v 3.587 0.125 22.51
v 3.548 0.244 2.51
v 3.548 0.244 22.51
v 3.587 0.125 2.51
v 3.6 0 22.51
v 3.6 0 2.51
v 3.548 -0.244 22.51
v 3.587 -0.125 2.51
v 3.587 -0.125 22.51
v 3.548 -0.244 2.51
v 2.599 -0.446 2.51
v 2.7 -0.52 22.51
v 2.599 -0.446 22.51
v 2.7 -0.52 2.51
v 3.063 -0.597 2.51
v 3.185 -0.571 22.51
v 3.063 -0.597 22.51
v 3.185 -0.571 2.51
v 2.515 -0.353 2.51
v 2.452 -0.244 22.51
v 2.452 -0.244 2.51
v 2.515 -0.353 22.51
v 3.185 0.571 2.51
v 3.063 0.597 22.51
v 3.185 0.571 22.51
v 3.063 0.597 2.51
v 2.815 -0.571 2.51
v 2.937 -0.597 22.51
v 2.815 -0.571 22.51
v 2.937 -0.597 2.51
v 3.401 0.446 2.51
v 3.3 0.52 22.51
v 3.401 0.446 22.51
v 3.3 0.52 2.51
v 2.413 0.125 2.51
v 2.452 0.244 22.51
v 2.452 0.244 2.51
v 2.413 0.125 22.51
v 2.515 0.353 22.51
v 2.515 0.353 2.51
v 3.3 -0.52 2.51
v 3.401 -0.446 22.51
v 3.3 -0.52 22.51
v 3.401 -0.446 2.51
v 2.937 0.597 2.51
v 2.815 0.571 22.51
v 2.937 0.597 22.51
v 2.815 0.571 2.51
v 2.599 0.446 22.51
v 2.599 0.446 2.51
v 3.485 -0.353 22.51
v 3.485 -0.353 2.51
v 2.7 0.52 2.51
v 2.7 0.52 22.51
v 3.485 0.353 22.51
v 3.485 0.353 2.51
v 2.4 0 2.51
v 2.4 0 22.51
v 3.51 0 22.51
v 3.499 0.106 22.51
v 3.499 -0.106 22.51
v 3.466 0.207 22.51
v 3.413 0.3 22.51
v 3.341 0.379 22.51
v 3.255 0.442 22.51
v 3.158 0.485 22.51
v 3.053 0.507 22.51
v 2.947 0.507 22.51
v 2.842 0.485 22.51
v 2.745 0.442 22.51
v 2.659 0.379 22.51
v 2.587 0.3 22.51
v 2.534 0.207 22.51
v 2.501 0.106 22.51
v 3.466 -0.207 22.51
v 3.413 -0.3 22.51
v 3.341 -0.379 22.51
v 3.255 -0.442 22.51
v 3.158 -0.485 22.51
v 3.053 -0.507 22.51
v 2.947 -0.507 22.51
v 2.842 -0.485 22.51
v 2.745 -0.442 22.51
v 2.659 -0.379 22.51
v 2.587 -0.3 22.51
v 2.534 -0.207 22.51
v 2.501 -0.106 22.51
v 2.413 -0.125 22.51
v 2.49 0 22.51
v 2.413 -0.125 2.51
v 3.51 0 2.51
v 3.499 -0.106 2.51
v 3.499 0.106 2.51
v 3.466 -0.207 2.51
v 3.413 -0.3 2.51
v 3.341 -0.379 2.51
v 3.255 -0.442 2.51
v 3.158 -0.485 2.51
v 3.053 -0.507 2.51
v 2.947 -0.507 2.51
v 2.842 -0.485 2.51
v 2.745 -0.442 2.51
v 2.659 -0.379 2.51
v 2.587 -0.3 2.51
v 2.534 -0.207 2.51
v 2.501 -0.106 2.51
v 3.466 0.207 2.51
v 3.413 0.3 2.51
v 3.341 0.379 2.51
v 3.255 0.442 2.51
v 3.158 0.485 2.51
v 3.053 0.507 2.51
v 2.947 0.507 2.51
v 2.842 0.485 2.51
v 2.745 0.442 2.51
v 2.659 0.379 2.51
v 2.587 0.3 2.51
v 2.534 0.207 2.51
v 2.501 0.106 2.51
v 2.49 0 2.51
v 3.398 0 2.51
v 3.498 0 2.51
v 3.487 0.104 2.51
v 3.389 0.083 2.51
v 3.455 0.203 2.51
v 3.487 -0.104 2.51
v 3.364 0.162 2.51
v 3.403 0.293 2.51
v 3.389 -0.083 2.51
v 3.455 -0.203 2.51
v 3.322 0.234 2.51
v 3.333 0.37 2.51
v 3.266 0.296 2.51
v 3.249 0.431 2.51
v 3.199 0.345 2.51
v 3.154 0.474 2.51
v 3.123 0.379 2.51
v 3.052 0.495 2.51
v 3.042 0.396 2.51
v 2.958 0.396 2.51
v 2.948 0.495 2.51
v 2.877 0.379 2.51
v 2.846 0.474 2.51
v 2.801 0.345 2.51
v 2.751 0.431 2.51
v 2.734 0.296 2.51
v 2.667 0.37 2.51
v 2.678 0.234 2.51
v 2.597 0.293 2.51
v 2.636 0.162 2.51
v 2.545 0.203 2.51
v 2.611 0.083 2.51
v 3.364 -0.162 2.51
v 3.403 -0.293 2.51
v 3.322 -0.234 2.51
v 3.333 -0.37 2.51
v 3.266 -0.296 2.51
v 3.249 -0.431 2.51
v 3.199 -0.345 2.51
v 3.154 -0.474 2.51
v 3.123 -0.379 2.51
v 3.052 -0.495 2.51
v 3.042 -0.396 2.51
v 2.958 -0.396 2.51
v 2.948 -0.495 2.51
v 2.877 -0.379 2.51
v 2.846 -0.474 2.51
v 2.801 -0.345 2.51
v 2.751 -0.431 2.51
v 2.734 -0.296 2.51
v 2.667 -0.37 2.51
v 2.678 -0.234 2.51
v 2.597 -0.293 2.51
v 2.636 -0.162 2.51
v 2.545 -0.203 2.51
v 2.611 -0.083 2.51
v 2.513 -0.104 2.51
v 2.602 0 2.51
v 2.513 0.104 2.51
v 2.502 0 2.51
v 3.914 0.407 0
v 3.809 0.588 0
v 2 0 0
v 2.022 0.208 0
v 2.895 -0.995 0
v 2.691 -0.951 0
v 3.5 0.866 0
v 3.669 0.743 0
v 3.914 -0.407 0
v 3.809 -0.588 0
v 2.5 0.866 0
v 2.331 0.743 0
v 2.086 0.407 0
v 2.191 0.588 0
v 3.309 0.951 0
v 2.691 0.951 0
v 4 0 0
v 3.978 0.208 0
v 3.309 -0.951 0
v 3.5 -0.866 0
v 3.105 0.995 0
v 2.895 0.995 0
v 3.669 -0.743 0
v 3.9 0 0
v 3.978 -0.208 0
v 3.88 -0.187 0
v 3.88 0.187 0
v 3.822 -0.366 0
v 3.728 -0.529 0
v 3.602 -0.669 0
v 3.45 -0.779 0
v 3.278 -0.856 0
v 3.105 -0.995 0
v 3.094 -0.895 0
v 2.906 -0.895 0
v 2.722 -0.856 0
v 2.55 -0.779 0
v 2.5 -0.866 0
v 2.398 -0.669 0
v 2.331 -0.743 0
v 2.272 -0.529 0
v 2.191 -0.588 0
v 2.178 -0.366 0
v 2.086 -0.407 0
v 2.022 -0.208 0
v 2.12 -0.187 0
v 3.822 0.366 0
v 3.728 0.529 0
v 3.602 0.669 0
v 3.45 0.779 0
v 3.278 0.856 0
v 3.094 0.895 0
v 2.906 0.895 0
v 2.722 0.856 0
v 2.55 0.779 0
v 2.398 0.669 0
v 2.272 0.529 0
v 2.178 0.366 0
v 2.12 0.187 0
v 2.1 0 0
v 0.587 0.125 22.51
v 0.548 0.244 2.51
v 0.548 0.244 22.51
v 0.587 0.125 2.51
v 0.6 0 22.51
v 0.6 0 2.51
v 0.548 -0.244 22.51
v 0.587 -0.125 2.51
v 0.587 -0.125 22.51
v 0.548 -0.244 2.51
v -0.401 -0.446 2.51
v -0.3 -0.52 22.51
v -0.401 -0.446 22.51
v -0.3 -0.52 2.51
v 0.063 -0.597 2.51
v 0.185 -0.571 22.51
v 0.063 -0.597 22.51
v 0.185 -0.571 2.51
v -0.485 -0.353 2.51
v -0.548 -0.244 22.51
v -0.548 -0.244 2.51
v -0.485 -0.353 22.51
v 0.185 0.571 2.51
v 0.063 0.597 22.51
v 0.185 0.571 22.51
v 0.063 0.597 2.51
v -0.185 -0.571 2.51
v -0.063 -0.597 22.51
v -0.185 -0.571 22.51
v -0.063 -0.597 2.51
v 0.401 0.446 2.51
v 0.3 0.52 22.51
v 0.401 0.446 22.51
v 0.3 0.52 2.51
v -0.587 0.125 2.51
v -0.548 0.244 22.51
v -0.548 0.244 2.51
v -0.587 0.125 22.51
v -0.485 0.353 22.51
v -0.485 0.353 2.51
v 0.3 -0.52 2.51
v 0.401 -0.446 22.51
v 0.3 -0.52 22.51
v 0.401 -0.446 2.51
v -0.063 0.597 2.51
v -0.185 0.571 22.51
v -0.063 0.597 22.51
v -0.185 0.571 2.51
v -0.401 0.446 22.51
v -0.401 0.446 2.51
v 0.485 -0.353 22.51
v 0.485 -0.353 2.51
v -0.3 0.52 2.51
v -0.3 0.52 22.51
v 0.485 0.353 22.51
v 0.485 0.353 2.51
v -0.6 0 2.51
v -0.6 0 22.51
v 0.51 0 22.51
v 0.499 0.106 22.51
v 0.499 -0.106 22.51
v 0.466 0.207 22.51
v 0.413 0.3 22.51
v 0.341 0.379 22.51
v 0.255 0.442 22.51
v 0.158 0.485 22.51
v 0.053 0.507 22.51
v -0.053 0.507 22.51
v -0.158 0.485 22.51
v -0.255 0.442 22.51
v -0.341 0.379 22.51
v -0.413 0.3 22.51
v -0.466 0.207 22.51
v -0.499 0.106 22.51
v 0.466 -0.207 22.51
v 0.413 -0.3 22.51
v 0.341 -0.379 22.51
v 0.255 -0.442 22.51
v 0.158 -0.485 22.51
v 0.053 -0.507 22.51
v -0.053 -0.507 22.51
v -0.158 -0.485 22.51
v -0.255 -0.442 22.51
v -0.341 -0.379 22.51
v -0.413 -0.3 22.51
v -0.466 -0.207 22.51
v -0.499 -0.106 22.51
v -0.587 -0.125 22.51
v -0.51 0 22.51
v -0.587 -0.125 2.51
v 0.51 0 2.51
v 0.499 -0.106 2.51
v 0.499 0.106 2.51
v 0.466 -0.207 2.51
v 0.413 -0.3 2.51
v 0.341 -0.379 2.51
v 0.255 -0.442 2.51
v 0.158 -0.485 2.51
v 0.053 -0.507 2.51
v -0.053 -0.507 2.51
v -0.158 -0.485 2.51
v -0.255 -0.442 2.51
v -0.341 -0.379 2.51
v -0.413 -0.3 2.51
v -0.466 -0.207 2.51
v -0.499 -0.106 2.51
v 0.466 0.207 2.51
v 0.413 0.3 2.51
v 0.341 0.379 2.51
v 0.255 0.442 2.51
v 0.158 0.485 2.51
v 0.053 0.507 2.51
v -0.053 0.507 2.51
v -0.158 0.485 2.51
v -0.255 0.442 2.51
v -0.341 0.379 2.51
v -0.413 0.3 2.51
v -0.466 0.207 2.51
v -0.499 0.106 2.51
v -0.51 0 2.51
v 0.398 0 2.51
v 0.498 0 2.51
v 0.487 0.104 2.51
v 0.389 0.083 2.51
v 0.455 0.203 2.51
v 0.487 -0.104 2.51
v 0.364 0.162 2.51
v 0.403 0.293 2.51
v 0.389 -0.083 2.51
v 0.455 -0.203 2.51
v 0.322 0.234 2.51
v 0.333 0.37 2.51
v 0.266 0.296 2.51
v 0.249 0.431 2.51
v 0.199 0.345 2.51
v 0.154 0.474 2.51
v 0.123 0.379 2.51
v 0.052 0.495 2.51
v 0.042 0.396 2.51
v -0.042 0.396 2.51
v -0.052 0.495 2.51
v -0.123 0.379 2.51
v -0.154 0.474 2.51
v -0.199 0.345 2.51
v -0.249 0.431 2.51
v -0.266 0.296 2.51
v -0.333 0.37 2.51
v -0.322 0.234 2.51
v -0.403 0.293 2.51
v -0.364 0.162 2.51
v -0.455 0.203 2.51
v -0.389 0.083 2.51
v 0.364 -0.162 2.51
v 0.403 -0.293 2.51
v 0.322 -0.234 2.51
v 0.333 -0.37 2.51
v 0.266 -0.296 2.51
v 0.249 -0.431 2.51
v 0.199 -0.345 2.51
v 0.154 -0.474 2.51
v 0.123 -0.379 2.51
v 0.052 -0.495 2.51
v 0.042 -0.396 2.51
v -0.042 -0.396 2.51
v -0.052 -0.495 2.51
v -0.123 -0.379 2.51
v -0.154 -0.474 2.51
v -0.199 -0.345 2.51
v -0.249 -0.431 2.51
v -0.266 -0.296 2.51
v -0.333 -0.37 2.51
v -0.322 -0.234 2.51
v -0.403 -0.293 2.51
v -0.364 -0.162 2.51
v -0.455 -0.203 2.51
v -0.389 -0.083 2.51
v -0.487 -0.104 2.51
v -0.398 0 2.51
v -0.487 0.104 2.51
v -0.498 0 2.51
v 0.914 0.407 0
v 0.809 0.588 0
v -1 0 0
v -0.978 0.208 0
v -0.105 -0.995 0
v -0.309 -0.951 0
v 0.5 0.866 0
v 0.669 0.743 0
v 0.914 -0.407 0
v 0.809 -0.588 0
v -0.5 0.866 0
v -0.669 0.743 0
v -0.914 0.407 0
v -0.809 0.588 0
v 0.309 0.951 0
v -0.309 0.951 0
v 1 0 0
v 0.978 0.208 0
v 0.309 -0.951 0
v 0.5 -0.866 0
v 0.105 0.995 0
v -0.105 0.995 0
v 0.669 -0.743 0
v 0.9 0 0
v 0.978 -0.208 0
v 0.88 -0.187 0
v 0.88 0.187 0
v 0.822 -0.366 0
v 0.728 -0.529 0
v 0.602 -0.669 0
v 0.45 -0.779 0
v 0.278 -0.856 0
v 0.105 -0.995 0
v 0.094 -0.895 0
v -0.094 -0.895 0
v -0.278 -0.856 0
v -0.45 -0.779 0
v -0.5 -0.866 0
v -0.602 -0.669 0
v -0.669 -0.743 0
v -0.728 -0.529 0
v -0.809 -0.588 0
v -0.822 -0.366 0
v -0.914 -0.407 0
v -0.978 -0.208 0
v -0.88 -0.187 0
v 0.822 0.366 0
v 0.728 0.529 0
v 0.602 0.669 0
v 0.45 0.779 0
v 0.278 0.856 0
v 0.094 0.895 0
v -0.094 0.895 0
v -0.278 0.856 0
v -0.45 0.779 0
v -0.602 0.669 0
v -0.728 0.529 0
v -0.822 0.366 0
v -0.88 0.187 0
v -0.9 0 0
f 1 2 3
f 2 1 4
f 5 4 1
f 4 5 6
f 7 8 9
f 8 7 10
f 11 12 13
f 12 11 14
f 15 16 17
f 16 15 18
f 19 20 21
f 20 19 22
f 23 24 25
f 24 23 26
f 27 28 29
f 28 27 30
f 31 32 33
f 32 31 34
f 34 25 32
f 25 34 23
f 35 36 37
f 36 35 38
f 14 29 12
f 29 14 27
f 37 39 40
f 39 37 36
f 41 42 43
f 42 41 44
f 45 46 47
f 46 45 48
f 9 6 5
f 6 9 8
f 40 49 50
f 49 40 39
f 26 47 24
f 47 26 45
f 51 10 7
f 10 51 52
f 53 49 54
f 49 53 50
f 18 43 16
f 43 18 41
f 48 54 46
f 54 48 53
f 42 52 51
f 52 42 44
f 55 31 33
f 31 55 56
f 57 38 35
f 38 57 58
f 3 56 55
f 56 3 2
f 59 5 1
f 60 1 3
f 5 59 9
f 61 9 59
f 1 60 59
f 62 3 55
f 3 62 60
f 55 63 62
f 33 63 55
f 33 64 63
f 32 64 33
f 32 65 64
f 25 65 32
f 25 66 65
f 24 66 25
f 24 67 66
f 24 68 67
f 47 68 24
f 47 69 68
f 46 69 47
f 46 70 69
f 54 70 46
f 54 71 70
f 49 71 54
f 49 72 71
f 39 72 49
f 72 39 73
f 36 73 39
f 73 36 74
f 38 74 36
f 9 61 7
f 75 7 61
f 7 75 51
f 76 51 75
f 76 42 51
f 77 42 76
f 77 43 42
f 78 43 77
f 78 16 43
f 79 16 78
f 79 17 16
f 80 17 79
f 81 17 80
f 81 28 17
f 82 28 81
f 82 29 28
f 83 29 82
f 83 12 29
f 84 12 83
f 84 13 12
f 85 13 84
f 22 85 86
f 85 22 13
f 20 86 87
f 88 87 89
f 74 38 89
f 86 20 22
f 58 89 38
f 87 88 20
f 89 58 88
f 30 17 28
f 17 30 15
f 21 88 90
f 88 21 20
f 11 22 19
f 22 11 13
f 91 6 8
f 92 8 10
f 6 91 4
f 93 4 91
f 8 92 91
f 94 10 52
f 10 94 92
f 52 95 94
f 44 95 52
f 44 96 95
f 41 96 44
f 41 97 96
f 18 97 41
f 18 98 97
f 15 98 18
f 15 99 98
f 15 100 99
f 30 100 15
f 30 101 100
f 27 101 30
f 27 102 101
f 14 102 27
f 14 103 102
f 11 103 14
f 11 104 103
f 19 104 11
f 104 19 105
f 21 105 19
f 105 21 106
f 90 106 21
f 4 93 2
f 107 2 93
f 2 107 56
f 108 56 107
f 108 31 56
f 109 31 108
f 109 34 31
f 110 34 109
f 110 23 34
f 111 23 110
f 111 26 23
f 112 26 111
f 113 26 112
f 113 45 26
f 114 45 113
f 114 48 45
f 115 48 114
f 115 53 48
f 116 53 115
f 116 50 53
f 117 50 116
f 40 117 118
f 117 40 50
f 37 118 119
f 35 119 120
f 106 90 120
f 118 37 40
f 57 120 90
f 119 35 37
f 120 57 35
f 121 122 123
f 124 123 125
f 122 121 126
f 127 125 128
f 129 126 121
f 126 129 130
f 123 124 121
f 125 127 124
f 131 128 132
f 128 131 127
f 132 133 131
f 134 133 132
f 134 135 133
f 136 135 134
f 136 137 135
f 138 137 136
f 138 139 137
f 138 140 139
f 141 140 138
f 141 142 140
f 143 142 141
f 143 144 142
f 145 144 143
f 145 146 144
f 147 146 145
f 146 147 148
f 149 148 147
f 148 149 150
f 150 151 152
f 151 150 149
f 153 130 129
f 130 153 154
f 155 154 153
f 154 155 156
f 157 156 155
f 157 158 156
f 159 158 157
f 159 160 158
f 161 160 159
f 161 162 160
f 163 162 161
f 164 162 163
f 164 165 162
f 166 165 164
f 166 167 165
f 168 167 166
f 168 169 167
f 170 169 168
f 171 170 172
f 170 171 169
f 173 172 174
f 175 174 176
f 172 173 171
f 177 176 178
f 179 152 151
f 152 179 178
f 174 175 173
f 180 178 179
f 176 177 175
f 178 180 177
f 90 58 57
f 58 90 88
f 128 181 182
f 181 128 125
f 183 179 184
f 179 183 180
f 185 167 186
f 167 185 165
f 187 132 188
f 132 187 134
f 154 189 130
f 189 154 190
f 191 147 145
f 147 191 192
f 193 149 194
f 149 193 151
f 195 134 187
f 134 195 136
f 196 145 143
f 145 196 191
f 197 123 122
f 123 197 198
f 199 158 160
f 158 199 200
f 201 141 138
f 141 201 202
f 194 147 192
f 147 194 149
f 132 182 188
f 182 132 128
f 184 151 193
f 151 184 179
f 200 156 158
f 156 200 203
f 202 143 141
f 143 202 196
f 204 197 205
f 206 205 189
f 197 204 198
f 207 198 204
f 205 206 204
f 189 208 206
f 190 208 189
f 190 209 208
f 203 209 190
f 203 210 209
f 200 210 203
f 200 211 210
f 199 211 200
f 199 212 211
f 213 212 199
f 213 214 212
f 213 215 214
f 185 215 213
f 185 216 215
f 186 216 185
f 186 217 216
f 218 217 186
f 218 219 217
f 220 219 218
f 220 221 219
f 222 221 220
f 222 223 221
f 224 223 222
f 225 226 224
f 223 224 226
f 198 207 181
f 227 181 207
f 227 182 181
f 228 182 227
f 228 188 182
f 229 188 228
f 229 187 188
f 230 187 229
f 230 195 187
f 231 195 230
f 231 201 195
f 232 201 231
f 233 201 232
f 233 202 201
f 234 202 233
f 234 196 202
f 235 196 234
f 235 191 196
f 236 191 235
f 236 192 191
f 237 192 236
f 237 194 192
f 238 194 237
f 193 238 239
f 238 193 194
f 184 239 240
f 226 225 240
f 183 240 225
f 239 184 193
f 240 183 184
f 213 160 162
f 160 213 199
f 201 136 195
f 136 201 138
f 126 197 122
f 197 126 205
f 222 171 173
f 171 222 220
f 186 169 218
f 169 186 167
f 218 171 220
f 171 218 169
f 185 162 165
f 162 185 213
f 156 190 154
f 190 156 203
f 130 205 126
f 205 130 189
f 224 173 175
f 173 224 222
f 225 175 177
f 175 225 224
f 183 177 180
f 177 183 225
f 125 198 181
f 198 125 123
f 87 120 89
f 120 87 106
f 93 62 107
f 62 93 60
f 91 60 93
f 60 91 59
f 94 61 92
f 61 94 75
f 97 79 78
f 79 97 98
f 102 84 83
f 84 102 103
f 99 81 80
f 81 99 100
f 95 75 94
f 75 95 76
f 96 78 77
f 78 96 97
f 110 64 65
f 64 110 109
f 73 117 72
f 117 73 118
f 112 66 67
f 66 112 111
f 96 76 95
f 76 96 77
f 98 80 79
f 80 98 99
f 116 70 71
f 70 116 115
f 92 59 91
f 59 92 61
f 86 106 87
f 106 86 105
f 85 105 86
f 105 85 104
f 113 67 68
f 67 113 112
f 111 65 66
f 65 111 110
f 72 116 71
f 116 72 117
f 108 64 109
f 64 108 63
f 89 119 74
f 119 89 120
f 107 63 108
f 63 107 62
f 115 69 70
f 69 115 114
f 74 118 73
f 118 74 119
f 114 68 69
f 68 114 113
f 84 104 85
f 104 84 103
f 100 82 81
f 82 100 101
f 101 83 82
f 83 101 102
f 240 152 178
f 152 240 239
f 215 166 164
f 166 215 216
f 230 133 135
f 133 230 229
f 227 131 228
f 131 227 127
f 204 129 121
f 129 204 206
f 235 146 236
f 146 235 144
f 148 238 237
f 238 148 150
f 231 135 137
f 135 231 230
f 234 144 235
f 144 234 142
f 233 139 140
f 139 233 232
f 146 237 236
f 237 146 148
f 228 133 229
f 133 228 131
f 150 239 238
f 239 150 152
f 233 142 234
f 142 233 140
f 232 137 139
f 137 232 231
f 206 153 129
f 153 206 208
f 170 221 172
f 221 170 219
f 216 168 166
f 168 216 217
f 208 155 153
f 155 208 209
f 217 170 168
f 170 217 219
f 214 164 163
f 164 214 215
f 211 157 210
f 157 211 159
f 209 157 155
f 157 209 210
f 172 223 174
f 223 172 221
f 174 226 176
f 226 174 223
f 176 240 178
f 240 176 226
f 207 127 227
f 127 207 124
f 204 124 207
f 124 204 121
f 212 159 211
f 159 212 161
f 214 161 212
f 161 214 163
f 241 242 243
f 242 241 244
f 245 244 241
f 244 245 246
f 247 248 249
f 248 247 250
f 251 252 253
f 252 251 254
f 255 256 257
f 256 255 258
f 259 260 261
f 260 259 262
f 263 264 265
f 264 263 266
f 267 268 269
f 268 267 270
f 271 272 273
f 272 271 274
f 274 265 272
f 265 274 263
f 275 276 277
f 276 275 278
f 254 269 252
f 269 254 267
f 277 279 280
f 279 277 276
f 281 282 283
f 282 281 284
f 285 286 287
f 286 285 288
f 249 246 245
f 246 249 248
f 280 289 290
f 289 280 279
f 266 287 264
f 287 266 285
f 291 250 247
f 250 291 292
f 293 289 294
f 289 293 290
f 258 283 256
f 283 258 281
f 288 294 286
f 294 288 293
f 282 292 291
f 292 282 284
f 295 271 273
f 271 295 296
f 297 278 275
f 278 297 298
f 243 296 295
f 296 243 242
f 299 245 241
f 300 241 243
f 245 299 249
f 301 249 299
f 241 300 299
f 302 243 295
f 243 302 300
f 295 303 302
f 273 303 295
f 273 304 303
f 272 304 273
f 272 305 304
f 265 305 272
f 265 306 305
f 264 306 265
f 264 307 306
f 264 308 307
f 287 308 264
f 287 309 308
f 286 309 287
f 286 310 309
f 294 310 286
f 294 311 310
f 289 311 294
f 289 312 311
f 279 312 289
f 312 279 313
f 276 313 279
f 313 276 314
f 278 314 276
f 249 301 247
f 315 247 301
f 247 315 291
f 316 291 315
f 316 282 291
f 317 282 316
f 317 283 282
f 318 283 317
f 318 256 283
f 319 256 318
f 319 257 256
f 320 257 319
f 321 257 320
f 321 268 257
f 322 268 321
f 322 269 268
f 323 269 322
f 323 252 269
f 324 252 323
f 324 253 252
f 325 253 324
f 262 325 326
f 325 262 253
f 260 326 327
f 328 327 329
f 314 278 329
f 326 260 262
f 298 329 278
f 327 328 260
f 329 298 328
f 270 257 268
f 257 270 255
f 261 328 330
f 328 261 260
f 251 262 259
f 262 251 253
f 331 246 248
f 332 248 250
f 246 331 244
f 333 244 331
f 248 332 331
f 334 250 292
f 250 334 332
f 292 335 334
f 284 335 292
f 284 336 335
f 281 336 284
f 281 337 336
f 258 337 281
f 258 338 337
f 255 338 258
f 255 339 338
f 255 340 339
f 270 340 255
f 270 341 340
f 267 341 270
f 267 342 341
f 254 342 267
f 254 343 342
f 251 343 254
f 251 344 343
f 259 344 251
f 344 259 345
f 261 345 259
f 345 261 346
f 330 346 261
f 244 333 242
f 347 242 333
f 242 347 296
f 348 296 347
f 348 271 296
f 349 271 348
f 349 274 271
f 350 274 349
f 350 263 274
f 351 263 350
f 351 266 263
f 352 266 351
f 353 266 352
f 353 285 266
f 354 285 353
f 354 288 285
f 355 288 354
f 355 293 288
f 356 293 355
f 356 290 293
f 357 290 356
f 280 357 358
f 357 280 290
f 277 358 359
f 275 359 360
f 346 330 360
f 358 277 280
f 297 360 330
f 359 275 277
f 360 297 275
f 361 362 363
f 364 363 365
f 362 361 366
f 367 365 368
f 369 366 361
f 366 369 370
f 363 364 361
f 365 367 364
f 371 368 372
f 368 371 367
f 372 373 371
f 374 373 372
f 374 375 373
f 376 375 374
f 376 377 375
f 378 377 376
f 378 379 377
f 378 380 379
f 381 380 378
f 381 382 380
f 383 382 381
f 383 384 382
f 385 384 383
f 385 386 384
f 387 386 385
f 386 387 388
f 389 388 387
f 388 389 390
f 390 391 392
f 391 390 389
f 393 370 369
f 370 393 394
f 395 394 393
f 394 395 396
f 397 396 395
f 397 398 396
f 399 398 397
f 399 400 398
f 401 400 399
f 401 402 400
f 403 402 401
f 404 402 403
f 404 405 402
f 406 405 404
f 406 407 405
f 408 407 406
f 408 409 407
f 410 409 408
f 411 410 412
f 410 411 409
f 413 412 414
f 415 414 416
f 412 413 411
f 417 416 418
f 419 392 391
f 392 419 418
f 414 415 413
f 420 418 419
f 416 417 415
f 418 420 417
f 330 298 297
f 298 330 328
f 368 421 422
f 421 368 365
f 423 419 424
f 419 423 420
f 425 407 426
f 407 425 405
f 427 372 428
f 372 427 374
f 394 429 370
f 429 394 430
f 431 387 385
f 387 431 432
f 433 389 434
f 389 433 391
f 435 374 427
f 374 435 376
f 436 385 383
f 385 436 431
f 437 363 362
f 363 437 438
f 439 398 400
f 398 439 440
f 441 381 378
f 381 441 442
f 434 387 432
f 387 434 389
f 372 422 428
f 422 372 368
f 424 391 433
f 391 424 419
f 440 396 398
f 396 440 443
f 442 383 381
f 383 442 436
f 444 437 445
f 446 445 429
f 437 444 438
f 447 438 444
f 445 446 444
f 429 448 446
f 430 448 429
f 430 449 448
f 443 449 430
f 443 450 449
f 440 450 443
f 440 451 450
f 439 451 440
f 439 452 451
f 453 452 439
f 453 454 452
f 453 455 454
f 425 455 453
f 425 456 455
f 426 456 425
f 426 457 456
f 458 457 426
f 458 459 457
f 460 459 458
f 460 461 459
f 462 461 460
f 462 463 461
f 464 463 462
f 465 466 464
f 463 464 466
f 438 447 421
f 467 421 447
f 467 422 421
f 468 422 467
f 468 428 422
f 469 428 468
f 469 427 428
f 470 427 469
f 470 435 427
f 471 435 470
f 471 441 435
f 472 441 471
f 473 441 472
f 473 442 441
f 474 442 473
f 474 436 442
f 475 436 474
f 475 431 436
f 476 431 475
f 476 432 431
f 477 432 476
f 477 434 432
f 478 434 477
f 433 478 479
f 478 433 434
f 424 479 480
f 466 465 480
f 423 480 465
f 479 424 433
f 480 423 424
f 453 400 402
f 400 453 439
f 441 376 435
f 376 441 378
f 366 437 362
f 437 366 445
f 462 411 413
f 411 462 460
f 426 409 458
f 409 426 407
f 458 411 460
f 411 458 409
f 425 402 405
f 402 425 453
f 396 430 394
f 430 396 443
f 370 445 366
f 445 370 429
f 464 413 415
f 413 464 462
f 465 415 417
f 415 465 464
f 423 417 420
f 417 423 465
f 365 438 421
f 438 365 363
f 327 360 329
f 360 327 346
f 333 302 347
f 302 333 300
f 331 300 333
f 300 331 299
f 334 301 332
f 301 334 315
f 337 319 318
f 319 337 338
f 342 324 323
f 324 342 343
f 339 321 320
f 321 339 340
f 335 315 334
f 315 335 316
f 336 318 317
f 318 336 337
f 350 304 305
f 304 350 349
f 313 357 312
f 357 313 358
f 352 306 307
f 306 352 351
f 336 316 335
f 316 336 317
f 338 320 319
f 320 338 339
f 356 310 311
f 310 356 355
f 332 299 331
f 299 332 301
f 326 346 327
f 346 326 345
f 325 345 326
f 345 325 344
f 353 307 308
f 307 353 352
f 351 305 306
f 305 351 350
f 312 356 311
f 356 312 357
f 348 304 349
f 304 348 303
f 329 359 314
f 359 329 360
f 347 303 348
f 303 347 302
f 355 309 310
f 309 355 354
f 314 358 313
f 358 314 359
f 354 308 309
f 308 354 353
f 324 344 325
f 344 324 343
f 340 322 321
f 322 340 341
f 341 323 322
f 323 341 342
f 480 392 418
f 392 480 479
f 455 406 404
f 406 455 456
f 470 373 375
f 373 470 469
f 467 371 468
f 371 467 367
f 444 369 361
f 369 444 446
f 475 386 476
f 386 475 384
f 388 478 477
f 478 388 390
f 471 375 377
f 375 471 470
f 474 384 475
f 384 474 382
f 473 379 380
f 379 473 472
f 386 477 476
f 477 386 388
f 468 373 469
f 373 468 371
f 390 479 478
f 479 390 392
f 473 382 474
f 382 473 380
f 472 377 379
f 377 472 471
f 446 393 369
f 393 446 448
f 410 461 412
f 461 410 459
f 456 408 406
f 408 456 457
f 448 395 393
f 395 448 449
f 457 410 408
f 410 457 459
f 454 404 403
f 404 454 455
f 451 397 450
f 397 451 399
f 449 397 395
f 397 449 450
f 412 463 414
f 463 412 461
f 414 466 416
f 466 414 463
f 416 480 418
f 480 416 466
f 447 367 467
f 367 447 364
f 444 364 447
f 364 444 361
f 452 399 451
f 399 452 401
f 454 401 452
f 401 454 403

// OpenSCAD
// file: forward_landing_gear.scad
use <ship_hull.scad>
module forward_landing_gear(hull_length=10, hull_radius=1,N=50){
	cubey=1;
		//union(){
		difference(){
			ship_hull(hull_length,hull_radius,N);
			mirror([0,1,0])		translate([0,cubey/2+.2,0])cube([hull_length*2,cubey,hull_radius*2],center=true);
			translate([0,cubey/2+.2,0])cube([hull_length*2,cubey,hull_radius*2],center=true);
			translate([0,0,hull_radius/2])cube([hull_length*2,1,1],center=true);
			translate([-5,0,-hull_radius/2])cube([hull_length*2,1,1],center=true);
			translate([hull_length-1,0,0])cube([2,1,2],center=true);
			scale(0.9)scale([hull_length,hull_radius,hull_radius]) sphere(r=1.0,$fn=N);
		}
}

forward_landing_gear();
// file: ship_hull.scad
module ship_hull(hull_length=10, hull_radius=1, N=50) {
	scale([hull_length,hull_radius,hull_radius]) sphere(r=1.0,$fn=N);
}
hull();
// file: airfoil.scad
module airfoil(wing_upper_axis=0.3, wing_lower_axis=0.2, upper_leading_scale=2, lower_scale=4, N=50) {

	upper_leading_z_offset=[-wing_upper_axis,wing_upper_axis];
	//upper_leading_rear_cutout_offset=[wing_length/2,(-wing_length)/2];
	upper_trailing_scale = lower_scale*2-upper_leading_scale;

	union(){
		// upper leading //
		translate([(lower_scale-upper_leading_scale)*wing_upper_axis,0]){
			scale([upper_leading_scale,1]){
				difference(){

					circle(r=wing_upper_axis,$fn=N);
					translate([0,-1*wing_upper_axis/2])square([wing_upper_axis*2,wing_upper_axis],center=true);
					translate([-wing_upper_axis/2,0])square([wing_upper_axis,wing_upper_axis*2],center=true);
				}
			}
		}
		// lower //
		scale([lower_scale*(wing_upper_axis/wing_lower_axis),1]){
			difference(){
				circle(r=wing_lower_axis,$fn=N);
				translate([0,wing_lower_axis/2])square([wing_lower_axis*2,wing_lower_axis],center=true);
			}
		}
		// upper trailing //
		translate([(lower_scale-upper_leading_scale)*wing_upper_axis,0]){
			scale([upper_trailing_scale,1]){
				difference(){
					circle(r=wing_upper_axis,$fn=N);
					translate([0,-1*wing_upper_axis/2])square([wing_upper_axis*2,wing_upper_axis],center=true);
					translate([wing_upper_axis/2,0])square([wing_upper_axis,wing_upper_axis*2],center=true);
				}
			}
		}
	}
}
airfoil();
// main file
//// VARIABLES ////

use <spaceship.scad>

// BARREL //
function outer_barrel_radius() = 0.6;
function inner_barrel_radius() = 0.85*outer_barrel_radius();
function barrel_length() = 20;
barrel_x_diff=[0,3];

// MUZZLE CONE //
function cone_length() = 5;
function cone_base_radius() = 1;
function cone_angle() = atan(cone_length()/cone_base_radius());
function cone_intersection_distance() = inner_barrel_radius() * tan(cone_angle()) - 0.04;

//// GENERATION CODE ////

for (i = [1:2]){
translate([barrel_x_diff[i],0,0])
	difference(){
		union(){
			translate([0,0,cone_intersection_distance()]) cylinder(h=barrel_length(),r=outer_barrel_radius(),$fn=N());
			rotate_extrude($fn=N())
				polygon(points=[[0,0],[cone_base_radius(),0],[0,cone_length()]]);

		}
		union(){
			translate([0,0,cone_intersection_distance()]) cylinder(h=barrel_length(),r=inner_barrel_radius(),$fn=N());
			scale(0.9)
				rotate_extrude($fn=N())
				polygon(points=[[0,0],[cone_base_radius(),0],[0,cone_length()]]);

		}
	}
}
